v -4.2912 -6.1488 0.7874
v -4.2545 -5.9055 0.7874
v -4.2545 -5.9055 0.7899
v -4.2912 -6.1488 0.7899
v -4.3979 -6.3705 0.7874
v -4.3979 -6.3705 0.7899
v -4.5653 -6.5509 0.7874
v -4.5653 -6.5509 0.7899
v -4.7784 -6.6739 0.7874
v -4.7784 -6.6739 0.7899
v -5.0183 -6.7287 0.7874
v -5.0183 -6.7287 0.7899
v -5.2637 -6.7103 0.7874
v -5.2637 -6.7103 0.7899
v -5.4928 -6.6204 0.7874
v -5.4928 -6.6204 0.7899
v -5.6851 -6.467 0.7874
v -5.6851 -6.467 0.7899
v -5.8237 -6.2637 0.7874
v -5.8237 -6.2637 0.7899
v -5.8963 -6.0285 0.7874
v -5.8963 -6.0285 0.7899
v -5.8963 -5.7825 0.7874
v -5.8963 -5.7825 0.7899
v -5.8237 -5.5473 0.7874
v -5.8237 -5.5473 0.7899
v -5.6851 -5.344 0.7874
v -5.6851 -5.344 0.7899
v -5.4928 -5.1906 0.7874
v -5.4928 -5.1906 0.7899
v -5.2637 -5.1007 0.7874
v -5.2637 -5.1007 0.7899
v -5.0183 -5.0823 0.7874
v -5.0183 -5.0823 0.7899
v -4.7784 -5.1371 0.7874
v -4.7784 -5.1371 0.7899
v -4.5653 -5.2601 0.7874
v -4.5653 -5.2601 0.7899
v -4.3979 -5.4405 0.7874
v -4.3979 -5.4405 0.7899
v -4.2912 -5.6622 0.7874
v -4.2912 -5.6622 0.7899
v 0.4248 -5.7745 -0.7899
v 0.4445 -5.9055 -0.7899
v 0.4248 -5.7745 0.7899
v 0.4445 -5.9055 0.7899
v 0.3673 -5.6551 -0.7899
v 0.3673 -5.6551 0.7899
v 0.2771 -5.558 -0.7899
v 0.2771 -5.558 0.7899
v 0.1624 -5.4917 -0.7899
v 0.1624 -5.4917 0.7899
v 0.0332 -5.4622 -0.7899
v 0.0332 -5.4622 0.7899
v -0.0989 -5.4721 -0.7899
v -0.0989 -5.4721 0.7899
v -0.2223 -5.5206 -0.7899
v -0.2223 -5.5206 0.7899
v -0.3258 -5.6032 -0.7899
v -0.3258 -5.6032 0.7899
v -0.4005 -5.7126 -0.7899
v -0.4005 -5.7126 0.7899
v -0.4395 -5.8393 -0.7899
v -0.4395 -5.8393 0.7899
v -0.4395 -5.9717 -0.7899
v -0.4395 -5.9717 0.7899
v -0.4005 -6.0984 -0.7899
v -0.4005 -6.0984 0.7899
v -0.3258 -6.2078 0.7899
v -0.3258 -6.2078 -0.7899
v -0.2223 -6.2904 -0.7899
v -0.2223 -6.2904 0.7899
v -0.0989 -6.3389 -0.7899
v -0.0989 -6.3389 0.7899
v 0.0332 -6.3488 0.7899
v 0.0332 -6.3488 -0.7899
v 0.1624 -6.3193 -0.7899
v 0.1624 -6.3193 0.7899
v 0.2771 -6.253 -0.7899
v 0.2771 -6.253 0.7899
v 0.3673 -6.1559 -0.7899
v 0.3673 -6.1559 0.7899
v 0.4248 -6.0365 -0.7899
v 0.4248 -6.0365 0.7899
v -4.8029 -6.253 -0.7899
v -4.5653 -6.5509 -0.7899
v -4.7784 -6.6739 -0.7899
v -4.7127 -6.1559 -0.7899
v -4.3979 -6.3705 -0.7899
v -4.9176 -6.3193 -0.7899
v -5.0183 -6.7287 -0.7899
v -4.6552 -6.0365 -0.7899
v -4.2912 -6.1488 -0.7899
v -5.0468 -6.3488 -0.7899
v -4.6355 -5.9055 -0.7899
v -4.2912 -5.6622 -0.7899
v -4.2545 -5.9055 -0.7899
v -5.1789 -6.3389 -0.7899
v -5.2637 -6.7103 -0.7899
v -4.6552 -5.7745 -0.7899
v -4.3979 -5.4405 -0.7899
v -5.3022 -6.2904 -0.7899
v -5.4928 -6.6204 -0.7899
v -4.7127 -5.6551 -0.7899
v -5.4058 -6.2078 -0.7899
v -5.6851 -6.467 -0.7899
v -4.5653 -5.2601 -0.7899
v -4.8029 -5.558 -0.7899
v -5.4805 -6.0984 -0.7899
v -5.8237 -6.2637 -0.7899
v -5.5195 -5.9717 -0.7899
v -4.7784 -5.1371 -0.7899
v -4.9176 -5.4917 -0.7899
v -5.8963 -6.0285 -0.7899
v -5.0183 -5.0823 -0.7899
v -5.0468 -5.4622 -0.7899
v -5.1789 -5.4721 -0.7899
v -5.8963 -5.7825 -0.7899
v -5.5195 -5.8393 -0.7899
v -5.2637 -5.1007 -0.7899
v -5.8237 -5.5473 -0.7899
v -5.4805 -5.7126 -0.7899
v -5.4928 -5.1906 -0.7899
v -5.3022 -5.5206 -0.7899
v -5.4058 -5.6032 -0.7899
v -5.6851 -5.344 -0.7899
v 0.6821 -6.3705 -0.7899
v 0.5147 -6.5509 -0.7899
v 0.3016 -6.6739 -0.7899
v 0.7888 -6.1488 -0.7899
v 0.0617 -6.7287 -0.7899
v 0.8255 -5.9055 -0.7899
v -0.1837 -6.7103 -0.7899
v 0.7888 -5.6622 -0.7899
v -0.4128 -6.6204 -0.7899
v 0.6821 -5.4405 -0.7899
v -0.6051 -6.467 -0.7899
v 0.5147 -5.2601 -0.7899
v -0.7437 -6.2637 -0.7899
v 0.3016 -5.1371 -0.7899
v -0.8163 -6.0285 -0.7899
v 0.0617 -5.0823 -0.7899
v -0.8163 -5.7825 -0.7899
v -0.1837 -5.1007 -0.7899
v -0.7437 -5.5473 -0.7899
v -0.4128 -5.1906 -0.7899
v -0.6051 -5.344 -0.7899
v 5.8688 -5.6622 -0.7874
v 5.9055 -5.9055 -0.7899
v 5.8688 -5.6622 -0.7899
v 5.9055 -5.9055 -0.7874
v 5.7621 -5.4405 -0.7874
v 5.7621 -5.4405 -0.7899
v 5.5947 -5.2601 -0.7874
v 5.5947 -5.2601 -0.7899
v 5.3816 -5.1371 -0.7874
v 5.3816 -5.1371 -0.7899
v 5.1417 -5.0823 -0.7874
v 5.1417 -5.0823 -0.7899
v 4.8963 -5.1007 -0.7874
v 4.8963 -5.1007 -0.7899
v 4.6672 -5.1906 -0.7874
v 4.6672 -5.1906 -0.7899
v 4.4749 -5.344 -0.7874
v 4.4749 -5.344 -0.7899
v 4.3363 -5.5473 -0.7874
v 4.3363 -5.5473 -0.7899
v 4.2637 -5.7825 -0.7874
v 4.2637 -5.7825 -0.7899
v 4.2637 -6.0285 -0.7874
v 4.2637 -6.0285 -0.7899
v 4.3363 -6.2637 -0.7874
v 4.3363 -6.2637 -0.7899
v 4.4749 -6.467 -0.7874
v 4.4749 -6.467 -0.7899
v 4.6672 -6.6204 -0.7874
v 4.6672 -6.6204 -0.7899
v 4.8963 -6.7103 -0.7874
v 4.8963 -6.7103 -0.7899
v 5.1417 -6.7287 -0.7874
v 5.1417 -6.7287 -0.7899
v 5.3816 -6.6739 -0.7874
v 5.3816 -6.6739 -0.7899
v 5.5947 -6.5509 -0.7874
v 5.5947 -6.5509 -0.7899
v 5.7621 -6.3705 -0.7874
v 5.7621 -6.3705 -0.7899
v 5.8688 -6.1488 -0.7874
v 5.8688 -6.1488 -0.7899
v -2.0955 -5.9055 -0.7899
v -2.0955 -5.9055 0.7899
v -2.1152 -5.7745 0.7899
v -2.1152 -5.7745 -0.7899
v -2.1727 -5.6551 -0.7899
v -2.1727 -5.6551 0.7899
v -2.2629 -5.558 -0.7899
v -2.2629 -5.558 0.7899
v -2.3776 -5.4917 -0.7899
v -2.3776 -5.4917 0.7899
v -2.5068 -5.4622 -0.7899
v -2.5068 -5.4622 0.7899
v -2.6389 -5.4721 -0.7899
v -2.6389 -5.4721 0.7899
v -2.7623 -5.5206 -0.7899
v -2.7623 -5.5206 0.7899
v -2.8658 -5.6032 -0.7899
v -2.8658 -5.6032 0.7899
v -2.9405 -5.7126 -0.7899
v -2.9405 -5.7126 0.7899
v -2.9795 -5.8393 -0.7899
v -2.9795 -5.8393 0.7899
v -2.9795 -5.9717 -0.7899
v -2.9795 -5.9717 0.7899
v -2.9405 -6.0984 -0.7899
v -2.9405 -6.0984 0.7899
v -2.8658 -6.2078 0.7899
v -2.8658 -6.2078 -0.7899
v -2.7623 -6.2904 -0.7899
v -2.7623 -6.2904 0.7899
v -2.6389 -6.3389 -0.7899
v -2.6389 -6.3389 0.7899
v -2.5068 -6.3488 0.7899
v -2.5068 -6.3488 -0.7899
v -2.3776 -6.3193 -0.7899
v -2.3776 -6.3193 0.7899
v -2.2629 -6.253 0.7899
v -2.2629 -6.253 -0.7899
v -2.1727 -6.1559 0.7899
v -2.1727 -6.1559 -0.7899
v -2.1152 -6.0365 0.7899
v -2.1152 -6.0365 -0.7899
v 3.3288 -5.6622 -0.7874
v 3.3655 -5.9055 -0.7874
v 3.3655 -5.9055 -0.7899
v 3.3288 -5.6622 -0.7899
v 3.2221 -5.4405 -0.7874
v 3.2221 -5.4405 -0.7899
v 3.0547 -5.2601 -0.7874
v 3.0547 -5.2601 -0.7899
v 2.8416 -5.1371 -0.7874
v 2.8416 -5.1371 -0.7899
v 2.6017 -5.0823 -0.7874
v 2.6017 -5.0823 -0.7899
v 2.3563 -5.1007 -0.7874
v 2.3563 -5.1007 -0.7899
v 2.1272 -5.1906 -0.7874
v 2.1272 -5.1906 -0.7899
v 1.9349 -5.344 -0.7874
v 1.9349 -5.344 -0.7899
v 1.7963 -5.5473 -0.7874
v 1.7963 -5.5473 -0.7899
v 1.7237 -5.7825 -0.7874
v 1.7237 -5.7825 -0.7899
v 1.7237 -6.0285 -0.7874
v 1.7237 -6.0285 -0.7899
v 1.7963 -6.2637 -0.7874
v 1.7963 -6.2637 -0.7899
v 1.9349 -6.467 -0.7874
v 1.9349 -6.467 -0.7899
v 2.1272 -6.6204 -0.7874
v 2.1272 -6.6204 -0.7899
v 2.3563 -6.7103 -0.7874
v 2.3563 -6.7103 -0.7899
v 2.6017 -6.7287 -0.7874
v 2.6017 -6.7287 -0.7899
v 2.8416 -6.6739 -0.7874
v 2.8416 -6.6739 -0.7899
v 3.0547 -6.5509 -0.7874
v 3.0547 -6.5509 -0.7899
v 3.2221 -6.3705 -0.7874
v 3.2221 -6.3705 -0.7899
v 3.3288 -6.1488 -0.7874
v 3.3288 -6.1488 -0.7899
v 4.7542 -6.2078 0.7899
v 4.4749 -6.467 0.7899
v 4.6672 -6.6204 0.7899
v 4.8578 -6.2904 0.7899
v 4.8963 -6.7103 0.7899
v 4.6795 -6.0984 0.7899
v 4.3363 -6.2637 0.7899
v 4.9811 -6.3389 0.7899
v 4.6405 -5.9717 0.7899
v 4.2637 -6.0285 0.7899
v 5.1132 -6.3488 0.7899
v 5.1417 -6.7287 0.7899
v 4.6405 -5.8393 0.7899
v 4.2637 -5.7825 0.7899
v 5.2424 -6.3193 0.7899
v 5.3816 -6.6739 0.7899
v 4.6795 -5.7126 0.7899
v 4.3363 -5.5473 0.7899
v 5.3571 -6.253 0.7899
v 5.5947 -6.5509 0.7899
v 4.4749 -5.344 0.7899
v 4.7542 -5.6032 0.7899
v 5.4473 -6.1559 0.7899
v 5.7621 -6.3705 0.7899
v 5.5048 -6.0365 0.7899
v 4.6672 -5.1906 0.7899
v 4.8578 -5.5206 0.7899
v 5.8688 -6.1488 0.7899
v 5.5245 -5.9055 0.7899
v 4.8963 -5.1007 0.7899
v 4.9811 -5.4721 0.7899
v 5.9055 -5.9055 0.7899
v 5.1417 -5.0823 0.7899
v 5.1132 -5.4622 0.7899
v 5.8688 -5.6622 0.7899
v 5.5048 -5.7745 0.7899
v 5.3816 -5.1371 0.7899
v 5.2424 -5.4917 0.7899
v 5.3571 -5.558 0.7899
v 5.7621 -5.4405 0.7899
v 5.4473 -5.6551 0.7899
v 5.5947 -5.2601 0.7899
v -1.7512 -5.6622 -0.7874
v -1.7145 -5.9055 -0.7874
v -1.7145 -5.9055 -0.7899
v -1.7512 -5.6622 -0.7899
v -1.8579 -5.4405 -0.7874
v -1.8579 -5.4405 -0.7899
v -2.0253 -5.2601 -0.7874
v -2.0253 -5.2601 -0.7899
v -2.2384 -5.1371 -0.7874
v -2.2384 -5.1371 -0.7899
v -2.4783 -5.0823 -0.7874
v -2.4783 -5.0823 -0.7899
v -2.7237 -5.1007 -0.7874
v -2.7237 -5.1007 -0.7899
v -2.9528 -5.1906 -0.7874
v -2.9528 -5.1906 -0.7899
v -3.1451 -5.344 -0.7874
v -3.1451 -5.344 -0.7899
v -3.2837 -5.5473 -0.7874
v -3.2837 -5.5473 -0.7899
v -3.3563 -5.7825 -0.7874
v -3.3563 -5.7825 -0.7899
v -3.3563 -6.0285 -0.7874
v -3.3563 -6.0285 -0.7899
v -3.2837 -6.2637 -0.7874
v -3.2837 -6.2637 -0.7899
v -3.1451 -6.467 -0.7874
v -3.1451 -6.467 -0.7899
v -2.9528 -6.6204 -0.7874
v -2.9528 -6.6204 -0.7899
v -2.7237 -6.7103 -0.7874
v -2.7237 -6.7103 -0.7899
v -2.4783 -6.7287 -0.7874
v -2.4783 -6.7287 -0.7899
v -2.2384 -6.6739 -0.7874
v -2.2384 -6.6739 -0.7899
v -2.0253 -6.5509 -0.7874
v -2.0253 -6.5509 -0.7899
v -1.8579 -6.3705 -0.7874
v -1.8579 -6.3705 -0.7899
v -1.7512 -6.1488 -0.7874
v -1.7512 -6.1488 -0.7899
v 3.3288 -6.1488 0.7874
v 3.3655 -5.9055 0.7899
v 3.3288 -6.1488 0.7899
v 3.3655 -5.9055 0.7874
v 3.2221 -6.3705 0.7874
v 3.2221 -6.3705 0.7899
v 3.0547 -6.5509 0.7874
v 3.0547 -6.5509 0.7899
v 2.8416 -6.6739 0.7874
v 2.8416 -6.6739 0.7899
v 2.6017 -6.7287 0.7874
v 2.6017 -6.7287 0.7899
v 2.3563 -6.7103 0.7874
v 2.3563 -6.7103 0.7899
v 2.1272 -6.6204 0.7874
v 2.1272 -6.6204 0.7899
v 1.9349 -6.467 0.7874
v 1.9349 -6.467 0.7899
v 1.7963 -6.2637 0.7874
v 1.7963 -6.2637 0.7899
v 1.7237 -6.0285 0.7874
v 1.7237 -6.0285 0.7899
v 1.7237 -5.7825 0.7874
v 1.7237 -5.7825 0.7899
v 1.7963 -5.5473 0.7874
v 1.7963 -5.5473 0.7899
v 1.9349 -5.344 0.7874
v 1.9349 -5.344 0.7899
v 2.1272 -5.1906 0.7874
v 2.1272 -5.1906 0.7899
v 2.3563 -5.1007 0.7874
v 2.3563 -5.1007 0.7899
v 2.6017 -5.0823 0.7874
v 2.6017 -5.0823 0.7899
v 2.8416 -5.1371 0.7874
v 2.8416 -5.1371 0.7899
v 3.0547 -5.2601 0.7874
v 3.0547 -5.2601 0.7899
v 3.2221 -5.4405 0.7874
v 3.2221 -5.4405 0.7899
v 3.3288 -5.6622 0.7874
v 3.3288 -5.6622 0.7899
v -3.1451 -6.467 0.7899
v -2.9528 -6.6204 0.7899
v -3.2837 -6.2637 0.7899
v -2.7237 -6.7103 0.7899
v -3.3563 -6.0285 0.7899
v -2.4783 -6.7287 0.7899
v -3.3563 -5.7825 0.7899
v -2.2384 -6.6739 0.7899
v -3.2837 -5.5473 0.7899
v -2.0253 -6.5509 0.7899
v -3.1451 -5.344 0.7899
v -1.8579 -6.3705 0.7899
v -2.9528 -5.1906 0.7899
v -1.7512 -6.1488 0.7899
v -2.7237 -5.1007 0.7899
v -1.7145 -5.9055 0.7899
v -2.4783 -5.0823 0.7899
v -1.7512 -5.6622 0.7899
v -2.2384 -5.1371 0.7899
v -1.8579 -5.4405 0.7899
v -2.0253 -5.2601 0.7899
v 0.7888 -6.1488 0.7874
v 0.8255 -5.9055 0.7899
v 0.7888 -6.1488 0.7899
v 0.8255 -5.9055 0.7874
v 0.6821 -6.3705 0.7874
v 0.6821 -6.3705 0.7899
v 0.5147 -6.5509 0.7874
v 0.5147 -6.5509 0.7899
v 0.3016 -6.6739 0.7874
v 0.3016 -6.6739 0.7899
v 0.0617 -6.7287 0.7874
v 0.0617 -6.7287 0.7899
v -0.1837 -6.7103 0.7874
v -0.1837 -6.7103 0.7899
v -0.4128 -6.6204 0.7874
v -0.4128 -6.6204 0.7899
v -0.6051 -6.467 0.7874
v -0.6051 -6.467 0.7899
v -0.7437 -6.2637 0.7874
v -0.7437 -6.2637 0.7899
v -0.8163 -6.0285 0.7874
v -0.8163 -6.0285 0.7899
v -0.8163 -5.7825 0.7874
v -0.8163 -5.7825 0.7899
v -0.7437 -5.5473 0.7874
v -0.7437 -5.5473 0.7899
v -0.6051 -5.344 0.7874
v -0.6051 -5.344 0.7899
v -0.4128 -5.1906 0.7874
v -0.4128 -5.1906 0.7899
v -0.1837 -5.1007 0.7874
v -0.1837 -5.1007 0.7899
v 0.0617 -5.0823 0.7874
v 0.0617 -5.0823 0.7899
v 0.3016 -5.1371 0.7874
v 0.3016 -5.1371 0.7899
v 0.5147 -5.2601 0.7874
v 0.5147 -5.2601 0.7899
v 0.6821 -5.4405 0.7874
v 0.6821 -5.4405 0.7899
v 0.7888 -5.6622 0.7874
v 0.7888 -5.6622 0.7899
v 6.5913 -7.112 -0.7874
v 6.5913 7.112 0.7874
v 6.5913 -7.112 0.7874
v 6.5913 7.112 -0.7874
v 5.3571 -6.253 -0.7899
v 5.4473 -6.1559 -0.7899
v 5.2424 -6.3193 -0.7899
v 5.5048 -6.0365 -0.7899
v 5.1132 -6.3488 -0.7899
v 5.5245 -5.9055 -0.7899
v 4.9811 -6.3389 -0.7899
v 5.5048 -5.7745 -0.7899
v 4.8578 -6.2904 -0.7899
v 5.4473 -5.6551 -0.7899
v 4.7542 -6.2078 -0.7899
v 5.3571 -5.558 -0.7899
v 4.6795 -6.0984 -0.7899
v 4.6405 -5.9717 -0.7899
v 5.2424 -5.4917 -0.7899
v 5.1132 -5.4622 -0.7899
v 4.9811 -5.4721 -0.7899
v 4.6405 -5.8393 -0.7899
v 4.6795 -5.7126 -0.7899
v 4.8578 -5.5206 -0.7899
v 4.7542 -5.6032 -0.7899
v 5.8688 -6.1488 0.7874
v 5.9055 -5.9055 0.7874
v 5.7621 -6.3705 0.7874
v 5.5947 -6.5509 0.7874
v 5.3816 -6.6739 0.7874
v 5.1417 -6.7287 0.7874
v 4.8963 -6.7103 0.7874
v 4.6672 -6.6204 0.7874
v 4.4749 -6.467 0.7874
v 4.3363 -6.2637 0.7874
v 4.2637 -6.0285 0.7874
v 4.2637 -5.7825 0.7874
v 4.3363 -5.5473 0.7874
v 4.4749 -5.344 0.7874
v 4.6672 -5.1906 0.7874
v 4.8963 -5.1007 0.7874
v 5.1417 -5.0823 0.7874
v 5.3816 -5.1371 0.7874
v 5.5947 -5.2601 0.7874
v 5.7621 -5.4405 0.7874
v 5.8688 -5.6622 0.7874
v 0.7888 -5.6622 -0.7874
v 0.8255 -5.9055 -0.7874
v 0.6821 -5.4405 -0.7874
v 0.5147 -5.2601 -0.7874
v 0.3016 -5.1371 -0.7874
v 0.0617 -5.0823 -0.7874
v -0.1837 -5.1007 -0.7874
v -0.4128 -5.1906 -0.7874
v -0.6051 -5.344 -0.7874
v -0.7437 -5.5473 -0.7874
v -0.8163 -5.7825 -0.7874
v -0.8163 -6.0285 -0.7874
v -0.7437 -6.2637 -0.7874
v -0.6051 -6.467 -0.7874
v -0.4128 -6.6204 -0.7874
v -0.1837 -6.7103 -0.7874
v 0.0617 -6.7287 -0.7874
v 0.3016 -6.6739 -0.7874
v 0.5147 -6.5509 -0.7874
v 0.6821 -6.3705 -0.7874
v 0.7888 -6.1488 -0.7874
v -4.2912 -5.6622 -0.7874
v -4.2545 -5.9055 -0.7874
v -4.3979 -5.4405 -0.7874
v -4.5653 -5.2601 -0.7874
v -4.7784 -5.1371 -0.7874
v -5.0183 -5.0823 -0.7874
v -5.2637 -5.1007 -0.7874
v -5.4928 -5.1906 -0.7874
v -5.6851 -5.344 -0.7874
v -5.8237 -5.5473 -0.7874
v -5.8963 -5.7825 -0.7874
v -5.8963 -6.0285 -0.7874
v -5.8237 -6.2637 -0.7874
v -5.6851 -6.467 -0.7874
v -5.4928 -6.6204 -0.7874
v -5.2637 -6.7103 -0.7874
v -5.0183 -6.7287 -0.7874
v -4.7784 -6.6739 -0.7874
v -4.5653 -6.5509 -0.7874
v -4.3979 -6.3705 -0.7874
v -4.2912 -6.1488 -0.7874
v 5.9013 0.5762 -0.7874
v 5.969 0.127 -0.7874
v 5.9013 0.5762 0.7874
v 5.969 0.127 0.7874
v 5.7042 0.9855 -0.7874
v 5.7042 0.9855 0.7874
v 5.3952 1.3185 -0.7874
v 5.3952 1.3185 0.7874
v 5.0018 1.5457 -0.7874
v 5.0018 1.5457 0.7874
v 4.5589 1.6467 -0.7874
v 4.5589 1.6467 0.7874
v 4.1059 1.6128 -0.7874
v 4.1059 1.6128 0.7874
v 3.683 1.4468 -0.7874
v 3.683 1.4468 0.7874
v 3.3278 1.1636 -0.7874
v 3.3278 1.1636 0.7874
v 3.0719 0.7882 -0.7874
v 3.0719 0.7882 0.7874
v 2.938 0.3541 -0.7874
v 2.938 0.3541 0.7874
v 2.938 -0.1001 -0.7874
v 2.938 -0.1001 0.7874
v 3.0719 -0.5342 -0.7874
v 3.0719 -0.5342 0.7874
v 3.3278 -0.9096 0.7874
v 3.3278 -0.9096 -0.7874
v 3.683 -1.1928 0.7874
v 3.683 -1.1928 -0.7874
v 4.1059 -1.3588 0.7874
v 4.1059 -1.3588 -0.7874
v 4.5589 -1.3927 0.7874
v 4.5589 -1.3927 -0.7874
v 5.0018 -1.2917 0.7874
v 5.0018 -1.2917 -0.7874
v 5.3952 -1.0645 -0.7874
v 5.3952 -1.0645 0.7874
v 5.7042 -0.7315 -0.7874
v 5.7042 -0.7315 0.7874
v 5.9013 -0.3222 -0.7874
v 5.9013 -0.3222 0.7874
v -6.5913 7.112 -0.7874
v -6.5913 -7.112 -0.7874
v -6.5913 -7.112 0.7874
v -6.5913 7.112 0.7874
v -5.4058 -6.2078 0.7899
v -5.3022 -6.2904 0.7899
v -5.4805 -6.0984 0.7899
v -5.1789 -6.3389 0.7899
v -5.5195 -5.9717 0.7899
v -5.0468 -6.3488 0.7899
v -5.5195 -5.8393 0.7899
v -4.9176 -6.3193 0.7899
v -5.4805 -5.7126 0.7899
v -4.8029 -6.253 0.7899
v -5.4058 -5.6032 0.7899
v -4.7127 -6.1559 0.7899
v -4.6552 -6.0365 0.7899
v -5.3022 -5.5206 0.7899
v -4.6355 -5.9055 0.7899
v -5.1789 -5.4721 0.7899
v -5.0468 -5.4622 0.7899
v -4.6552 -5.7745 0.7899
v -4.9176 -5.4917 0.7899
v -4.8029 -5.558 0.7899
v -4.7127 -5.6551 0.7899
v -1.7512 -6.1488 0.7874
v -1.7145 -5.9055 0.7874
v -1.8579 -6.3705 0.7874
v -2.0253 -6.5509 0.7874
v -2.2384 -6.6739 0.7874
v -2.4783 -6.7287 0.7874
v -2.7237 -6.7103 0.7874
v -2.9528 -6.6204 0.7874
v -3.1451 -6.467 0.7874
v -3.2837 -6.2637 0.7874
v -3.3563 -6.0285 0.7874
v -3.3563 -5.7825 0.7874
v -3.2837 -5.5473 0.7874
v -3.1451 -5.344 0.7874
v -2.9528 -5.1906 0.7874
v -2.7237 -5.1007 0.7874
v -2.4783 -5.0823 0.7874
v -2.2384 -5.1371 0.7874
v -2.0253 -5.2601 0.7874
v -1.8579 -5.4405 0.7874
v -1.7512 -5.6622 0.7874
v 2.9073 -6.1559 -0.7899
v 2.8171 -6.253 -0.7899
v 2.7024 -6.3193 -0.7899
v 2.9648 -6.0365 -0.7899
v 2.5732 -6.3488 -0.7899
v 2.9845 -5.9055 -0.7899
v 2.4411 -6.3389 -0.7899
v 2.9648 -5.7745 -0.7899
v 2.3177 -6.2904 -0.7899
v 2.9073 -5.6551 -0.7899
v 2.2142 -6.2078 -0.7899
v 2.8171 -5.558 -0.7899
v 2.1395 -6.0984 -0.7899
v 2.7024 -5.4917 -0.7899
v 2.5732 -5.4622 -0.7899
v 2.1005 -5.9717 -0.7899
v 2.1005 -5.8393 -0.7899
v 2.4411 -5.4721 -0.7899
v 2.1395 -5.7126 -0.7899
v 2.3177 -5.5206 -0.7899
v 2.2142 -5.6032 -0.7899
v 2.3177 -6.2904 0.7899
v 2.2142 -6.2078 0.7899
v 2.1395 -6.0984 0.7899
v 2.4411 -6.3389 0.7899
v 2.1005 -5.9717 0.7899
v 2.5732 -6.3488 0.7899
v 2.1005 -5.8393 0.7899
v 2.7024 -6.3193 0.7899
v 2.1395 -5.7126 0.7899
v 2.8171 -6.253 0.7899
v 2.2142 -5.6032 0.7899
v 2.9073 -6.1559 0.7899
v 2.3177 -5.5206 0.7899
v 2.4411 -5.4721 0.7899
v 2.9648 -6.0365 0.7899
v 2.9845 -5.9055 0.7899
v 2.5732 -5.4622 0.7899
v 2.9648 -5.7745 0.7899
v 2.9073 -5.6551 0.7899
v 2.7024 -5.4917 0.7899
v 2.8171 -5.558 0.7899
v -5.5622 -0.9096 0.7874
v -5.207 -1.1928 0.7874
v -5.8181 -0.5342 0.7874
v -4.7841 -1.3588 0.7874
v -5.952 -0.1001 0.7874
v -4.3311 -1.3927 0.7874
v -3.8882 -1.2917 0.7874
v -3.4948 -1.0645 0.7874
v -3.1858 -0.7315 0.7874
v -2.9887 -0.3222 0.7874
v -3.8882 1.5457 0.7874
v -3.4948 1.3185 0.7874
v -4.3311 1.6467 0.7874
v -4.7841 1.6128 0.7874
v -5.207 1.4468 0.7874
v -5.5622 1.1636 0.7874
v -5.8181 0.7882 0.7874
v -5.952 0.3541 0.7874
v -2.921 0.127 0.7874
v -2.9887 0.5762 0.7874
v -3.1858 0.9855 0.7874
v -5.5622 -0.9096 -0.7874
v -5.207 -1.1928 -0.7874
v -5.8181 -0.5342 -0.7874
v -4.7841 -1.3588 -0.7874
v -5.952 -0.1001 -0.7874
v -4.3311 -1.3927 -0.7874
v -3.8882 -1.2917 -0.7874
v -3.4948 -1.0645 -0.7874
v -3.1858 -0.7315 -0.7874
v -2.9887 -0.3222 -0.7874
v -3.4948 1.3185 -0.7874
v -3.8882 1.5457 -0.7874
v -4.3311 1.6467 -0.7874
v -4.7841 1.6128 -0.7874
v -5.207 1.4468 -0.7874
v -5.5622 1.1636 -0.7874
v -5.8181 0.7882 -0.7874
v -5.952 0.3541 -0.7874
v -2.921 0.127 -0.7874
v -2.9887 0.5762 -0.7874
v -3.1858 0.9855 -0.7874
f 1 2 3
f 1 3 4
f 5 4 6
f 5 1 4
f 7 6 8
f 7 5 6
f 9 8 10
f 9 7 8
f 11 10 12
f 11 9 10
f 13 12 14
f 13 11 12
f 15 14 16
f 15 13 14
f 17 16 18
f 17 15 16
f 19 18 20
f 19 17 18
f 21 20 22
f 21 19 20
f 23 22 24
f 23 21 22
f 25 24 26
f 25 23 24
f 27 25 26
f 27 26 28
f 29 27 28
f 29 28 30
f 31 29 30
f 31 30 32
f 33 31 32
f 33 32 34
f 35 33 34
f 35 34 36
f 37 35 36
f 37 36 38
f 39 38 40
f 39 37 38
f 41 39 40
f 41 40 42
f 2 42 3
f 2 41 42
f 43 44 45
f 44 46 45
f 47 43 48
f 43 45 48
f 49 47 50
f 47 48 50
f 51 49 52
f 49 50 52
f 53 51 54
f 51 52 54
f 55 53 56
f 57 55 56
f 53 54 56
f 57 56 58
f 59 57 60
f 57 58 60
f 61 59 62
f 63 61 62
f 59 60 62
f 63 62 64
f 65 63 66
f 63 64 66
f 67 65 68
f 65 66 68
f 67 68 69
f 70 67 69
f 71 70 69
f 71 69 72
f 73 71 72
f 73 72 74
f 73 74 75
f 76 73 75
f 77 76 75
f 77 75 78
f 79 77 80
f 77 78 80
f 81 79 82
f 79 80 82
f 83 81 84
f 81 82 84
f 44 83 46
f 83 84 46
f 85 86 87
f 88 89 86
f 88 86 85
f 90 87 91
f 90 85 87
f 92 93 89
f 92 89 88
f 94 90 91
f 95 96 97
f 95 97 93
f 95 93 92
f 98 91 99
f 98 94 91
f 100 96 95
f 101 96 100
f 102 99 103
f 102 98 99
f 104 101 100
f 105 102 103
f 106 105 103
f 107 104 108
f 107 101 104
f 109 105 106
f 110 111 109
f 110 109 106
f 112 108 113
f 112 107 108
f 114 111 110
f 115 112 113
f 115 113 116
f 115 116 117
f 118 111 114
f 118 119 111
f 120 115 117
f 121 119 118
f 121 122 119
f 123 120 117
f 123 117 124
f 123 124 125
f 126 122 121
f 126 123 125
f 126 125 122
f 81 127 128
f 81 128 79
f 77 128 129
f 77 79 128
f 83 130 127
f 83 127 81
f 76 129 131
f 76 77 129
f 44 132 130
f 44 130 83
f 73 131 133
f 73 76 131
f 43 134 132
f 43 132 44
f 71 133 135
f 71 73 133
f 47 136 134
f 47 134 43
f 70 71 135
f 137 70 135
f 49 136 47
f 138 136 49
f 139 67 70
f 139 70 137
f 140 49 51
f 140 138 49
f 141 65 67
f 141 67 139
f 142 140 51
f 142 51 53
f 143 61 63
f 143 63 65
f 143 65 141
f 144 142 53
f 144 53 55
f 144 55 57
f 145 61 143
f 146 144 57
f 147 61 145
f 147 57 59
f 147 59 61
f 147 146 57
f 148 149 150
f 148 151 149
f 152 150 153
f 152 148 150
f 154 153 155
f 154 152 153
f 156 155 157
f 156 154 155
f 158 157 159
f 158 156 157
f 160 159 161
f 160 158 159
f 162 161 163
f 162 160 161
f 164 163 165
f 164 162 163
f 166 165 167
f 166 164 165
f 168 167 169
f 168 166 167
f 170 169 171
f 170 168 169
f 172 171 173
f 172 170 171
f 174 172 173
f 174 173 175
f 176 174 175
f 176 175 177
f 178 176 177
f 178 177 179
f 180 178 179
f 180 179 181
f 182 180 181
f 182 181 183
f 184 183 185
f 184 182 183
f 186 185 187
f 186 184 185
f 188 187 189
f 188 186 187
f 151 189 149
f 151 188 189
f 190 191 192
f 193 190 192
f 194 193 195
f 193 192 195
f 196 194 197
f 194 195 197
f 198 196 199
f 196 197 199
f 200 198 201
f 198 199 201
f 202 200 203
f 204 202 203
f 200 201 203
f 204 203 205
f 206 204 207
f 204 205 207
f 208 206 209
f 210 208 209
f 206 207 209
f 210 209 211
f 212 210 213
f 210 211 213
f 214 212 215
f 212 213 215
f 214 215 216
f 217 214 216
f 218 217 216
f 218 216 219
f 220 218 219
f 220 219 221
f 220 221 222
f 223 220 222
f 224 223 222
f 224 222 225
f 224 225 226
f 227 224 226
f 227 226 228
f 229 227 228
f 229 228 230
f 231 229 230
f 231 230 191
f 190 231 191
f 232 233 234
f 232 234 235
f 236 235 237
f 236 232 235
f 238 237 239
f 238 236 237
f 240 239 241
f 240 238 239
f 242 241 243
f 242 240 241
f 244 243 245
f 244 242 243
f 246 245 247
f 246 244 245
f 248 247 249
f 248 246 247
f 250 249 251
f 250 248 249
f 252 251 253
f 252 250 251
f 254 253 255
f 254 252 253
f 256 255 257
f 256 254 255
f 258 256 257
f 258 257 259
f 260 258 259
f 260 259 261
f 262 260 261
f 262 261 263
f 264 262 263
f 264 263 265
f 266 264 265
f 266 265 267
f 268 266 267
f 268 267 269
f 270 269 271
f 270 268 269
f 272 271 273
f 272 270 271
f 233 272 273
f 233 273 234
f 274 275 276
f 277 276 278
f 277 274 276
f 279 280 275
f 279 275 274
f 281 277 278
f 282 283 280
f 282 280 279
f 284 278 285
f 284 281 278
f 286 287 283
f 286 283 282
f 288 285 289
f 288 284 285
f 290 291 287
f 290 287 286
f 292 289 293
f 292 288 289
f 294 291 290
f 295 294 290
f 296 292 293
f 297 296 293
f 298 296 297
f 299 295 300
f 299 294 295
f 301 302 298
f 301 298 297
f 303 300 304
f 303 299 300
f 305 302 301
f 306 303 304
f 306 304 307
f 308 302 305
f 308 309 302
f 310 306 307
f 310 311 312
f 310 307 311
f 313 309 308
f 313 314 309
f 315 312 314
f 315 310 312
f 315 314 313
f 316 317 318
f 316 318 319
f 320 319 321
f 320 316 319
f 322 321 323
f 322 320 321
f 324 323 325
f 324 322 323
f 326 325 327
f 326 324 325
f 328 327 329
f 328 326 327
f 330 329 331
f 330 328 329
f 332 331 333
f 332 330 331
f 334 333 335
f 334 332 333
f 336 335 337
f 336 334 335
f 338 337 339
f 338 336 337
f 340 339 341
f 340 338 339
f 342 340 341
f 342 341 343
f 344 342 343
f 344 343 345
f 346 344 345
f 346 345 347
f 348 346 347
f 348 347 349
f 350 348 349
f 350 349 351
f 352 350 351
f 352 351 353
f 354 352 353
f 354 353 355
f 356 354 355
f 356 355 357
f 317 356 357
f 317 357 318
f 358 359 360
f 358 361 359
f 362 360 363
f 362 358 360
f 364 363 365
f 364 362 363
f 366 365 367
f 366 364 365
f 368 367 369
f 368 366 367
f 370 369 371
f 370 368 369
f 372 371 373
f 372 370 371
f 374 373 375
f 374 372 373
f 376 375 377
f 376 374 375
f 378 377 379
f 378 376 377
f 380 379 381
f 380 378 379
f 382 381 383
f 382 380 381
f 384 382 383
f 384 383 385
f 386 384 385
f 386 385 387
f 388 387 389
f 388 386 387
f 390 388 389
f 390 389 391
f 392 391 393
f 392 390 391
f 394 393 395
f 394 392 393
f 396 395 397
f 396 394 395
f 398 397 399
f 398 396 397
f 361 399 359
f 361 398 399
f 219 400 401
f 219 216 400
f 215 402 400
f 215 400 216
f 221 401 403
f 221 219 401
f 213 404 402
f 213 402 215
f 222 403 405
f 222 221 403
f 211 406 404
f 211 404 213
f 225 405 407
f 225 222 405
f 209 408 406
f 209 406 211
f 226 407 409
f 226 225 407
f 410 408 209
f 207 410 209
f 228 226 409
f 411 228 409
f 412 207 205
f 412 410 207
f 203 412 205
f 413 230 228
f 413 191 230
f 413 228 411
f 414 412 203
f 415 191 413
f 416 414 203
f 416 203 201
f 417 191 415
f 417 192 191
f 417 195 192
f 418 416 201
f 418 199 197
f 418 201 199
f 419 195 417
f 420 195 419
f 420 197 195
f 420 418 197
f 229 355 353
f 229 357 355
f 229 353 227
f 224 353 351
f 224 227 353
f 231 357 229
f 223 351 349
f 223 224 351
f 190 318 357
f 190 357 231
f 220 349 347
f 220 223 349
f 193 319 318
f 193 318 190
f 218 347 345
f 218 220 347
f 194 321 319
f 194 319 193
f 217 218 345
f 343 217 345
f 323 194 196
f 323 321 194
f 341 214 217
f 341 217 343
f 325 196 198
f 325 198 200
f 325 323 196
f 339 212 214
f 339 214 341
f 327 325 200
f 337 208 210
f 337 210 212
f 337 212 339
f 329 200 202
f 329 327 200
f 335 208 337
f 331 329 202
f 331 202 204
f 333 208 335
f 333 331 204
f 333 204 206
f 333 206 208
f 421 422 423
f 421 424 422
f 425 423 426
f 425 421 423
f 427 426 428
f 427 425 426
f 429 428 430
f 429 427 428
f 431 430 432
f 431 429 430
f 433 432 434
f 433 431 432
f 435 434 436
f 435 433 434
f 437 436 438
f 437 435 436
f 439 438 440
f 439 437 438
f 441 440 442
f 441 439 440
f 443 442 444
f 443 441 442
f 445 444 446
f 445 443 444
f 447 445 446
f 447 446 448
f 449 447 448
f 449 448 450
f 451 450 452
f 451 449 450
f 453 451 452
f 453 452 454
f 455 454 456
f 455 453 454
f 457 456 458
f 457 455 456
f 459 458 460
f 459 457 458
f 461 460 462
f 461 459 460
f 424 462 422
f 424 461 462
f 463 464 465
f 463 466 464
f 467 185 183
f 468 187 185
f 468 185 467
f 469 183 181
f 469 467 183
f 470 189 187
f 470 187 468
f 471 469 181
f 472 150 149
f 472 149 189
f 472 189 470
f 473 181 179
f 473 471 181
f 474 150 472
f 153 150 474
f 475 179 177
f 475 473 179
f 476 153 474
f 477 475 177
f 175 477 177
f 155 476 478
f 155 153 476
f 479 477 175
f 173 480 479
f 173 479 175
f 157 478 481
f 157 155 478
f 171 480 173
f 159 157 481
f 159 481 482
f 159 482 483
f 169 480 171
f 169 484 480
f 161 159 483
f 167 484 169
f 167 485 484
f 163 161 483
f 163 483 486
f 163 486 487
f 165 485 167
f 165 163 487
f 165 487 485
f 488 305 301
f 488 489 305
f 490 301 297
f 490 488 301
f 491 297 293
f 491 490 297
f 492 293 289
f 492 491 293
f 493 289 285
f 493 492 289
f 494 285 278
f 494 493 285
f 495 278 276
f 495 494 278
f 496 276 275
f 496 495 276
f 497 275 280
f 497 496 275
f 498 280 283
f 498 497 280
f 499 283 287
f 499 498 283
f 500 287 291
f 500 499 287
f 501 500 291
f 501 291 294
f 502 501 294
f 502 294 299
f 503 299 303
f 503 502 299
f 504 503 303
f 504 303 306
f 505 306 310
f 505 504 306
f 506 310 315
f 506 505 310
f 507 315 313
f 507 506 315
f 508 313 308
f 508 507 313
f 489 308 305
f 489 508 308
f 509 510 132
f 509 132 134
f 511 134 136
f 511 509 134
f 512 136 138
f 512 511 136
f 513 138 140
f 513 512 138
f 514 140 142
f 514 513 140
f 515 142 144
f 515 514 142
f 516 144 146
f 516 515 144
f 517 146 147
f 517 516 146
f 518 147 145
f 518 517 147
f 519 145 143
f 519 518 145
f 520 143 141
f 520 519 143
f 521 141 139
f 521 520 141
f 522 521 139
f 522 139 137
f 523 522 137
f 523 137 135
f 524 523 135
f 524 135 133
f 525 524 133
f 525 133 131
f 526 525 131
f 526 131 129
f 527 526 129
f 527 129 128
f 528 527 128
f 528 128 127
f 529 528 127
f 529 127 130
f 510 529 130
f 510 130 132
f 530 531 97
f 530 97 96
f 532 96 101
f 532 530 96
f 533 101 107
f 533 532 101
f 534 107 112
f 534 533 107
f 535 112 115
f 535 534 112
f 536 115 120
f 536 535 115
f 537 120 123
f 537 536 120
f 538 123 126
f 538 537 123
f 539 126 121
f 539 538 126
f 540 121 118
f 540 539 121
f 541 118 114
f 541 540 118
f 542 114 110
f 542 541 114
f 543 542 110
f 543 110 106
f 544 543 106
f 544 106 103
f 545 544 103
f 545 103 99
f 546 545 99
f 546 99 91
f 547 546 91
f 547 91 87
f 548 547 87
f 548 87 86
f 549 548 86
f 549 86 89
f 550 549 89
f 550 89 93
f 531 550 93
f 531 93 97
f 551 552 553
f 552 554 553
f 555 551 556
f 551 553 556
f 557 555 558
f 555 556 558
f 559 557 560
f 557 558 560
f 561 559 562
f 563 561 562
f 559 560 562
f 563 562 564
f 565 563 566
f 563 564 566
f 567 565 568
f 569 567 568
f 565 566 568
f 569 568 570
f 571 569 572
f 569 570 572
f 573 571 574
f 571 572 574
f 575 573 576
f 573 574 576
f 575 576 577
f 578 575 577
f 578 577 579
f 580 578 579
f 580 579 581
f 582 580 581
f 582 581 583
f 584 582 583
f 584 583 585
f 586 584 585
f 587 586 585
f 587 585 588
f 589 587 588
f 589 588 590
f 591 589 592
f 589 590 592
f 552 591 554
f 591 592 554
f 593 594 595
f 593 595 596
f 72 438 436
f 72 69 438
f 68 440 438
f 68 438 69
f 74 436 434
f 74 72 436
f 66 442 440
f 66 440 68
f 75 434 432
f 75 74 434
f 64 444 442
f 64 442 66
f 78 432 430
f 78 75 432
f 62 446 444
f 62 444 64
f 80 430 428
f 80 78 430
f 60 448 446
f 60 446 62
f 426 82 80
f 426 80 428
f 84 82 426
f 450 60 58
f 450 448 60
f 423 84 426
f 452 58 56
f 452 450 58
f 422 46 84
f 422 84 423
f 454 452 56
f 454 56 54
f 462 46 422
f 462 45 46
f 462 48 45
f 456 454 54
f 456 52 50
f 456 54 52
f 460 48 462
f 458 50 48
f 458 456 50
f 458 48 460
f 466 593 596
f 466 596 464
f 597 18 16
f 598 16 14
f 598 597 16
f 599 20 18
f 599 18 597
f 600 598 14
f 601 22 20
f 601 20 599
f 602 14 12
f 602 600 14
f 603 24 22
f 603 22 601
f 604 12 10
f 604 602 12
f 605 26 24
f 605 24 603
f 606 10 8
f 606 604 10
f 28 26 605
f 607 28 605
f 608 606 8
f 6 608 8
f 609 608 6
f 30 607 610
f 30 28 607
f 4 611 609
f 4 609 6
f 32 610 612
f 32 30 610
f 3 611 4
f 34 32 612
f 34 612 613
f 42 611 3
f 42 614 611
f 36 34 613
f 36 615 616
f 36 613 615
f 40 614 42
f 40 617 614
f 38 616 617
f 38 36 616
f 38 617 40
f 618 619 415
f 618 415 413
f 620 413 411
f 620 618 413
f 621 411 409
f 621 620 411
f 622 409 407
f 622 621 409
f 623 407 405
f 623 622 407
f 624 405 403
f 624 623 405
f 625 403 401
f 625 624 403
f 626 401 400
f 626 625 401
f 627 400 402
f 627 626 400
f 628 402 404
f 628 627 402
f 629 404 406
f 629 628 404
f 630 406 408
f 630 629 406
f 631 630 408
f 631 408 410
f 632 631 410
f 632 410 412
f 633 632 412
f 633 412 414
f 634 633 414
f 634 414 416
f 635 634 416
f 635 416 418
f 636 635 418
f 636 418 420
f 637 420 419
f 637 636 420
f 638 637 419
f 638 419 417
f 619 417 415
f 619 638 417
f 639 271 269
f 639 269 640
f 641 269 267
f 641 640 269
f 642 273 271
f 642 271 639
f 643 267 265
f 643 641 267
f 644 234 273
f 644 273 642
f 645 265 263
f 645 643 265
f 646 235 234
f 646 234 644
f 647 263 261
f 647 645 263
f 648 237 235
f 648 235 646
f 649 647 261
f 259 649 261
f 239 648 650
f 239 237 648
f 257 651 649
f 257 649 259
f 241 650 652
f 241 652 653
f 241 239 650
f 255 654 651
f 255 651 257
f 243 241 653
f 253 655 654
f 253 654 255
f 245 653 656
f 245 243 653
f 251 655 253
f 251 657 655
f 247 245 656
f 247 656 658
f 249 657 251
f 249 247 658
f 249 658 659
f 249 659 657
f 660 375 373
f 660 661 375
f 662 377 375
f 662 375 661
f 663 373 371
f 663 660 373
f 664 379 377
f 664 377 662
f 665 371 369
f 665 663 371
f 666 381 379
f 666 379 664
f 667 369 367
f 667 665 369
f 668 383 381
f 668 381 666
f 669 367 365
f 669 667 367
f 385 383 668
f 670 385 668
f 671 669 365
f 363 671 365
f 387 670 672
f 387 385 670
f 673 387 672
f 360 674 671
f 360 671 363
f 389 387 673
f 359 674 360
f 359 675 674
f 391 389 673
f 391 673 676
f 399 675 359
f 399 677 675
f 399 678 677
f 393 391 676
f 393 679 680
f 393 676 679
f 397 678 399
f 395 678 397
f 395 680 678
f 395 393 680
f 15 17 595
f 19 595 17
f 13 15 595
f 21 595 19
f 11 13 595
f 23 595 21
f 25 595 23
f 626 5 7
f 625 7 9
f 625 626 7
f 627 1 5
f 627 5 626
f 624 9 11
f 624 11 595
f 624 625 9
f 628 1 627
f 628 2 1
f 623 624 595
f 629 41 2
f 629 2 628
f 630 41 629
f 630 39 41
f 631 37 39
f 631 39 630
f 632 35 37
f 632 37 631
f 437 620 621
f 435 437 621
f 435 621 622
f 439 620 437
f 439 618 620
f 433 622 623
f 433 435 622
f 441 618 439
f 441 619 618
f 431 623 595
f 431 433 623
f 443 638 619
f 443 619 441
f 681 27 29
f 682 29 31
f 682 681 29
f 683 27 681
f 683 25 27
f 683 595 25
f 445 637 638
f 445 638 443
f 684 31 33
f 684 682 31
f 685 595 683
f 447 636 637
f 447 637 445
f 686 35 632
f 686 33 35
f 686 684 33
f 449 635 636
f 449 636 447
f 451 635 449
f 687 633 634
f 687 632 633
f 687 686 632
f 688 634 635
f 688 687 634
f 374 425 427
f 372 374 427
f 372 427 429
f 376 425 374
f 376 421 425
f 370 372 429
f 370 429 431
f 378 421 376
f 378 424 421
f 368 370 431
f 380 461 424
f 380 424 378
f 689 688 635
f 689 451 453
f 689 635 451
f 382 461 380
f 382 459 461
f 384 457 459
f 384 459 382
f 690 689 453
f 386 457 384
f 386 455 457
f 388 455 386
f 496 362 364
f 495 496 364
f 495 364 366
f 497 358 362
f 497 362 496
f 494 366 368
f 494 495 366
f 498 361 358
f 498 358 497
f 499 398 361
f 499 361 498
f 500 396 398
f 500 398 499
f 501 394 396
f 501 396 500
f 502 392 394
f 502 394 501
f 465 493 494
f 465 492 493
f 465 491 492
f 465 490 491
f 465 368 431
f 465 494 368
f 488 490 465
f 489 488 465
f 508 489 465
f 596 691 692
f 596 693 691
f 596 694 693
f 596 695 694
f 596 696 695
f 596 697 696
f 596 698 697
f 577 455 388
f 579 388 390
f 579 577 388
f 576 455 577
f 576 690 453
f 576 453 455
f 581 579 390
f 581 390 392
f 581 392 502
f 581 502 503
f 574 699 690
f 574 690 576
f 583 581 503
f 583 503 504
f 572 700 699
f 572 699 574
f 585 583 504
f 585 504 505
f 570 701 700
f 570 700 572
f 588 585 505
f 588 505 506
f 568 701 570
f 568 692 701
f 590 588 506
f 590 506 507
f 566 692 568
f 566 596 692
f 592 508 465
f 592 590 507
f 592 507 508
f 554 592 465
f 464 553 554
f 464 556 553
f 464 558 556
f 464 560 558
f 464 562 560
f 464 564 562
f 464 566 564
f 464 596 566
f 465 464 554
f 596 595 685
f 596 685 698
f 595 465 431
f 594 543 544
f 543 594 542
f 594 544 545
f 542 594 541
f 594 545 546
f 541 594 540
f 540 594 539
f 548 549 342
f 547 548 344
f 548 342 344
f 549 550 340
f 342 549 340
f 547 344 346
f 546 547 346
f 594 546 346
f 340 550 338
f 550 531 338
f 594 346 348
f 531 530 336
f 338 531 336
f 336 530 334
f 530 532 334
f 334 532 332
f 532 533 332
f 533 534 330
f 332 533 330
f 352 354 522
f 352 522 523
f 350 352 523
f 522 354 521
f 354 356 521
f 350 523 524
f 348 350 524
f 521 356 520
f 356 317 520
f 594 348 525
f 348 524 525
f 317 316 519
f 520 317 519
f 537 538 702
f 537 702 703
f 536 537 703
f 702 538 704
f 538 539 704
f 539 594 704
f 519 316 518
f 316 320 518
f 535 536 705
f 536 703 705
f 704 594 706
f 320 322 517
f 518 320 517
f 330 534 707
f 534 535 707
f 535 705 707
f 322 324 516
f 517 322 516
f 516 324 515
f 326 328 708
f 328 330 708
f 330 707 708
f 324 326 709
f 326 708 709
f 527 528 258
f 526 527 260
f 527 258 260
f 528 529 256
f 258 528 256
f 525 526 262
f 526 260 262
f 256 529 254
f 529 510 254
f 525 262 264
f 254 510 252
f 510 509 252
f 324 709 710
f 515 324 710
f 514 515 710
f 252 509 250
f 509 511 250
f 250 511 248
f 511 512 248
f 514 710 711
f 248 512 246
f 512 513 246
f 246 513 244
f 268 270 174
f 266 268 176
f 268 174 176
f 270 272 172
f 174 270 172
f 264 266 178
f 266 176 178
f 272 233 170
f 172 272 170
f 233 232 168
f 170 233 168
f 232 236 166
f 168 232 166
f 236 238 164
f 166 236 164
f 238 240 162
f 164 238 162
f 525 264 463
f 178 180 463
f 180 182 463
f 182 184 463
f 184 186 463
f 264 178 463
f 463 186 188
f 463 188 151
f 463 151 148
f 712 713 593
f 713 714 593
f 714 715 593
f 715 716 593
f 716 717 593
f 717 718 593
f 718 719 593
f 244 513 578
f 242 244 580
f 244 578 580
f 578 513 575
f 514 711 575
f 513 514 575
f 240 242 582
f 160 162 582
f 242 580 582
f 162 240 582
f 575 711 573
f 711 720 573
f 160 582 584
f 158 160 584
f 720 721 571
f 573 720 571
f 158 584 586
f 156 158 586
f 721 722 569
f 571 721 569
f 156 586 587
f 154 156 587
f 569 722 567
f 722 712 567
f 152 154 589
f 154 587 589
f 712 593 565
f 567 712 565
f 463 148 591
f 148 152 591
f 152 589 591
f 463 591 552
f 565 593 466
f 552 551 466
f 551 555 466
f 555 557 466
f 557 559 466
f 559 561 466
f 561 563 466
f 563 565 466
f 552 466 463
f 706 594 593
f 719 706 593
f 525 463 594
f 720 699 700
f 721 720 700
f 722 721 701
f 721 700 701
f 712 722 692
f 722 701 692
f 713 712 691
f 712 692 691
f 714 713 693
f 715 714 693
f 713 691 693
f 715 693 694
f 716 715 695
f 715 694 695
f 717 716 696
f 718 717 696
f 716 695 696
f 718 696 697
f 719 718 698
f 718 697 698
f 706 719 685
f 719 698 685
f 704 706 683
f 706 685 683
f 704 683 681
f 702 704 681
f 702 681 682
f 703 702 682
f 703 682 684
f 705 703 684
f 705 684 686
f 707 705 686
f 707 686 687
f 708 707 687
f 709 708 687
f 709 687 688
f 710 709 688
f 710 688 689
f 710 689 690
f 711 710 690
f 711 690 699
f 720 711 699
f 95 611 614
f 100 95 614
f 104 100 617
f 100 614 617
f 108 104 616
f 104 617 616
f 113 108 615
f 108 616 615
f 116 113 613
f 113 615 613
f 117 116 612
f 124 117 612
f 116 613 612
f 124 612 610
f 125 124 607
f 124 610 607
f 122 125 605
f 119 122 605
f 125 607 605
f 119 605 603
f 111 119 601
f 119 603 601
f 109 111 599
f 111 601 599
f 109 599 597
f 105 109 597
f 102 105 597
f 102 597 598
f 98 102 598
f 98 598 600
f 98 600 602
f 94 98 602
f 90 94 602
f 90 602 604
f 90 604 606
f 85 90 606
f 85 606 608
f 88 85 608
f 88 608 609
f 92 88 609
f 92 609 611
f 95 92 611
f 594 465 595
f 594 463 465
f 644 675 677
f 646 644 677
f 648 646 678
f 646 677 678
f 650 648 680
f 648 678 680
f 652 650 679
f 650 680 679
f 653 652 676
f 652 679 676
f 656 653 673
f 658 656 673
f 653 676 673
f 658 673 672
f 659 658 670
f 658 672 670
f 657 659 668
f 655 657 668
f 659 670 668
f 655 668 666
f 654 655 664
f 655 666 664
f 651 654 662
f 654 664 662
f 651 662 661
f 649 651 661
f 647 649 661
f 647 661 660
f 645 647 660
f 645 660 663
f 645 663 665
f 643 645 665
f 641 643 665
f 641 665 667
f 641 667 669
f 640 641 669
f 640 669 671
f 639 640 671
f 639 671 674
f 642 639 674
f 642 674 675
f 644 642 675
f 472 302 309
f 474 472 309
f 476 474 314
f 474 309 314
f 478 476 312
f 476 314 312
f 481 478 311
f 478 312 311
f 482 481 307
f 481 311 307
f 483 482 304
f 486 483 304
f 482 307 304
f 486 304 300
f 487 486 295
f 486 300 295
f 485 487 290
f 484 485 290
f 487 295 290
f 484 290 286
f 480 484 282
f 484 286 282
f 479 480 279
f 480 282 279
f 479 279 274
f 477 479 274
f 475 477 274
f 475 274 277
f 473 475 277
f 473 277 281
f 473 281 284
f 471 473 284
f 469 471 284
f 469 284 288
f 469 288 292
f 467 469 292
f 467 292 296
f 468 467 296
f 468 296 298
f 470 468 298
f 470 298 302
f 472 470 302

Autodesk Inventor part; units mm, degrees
ref_plane "YZ Plane" through (0, 0, 0) normal (1, 0, 0) x (0, 1, 0)
ref_plane "XZ Plane" through (0, 0, 0) normal (0, 1, 0) x (-1, 0, 0)
ref_plane "XY Plane" through (0, 0, 0) normal (0, 0, 1) x (1, 0, 0)
sketch "Sketch1" plane through (0, 0, 0) normal (0, 0, 1) x (1, 0, 0)
  line L0 (6.5913, -7.112) -> (-6.5913, -7.112)
  line L1 (-6.5913, -7.112) -> (-6.5913, 7.112)
  line L2 (-6.5913, 7.112) -> (6.5913, 7.112)
  line L3 (6.5913, 7.112) -> (6.5913, -7.112)
  line L4 (6.5913, -7.112) -> (-6.5913, 7.112) construction
  line L5 (-6.5913, -7.112) -> (6.5913, 7.112) construction
  point P0 (0, 0)
  dimension "d0" = 13.1826
  dimension "d1" = 14.224
extrude "Extrusion1" add sketch "Sketch1" along normal mid plane 1.5748
sketch "Sketch2" plane through (0, 0, 0.7874) normal (0, 0, 1) x (1, 0, 0)
  circle A0 centre (-4.445, 0.127) radius 1.524
  circle A1 centre (4.445, 0.127) radius 1.524
  line L0 (0, 0) -> (0, 7.112) construction
  line L1 (6.5913, 7.112) -> (-6.5913, 7.112) construction
  dimension "d4" = 3.048
  dimension "d5" = 8.89
  dimension "d6" = 6.985
extrude "Extrusion2" cut sketch "Sketch2" against normal through all
sketch "Sketch3" plane through (0, 0, 0.7874) normal (0, 0, 1) x (1, 0, 0)
  circle A0 centre (0, -5.9055) radius 0.8255 construction
  line L0 (0, -6.731) -> (0, -7.112) construction
  line L1 (6.5913, -7.112) -> (-6.5913, -7.112) construction
  circle A1 centre (-5.08, -5.9055) radius 0.8255
  circle A2 centre (-2.54, -5.9055) radius 0.8255
  circle A3 centre (0, -5.9055) radius 0.8255
  circle A4 centre (2.54, -5.9055) radius 0.8255
  circle A5 centre (5.08, -5.9055) radius 0.8255
  point P0 (0, 0)
  dimension "d9" = 1.651
  dimension "d10" = 0.381
  dimension "d11" = 5.08
  dimension "d14" = 2.54
extrude "Extrusion3" add sketch "Sketch3" along normal blind 0.0025
mirror "Mirror1" about plane through (0, 0, 0) normal (0, 0, 1) of "Extrusion3"
sketch "Sketch4" plane through (-5.08, -5.9055, 0.7899) normal (0, 0, 1) x (1, 0, 0)
  circle A0 centre (0, 0) radius 0.8255 construction
  circle A1 centre (0, 0) radius 0.4445
  circle A2 centre (2.54, 0) radius 0.8255 construction
  line L0 (-1.5113, -1.2065) -> (11.6713, -1.2065) construction
  circle A3 centre (2.54, 0) radius 0.4445
  circle A4 centre (5.08, 0) radius 0.4445
  circle A5 centre (7.62, 0) radius 0.4445
  circle A6 centre (10.16, 0) radius 0.4445
  point P0 (5.08, 5.9055)
  dimension "d21" = 0.889
  dimension "d22" = 2.54
  dimension "d25" = 2.54
extrude "Extrusion4" cut sketch "Sketch4" against normal through all
sketch "Sketch5" plane through (0, 0, 0.7874) normal (0, 0, 1) x (1, 0, 0)
  point P0 (0, 0)
equation "\"d25\" = d22"
properties part number "pcb"
